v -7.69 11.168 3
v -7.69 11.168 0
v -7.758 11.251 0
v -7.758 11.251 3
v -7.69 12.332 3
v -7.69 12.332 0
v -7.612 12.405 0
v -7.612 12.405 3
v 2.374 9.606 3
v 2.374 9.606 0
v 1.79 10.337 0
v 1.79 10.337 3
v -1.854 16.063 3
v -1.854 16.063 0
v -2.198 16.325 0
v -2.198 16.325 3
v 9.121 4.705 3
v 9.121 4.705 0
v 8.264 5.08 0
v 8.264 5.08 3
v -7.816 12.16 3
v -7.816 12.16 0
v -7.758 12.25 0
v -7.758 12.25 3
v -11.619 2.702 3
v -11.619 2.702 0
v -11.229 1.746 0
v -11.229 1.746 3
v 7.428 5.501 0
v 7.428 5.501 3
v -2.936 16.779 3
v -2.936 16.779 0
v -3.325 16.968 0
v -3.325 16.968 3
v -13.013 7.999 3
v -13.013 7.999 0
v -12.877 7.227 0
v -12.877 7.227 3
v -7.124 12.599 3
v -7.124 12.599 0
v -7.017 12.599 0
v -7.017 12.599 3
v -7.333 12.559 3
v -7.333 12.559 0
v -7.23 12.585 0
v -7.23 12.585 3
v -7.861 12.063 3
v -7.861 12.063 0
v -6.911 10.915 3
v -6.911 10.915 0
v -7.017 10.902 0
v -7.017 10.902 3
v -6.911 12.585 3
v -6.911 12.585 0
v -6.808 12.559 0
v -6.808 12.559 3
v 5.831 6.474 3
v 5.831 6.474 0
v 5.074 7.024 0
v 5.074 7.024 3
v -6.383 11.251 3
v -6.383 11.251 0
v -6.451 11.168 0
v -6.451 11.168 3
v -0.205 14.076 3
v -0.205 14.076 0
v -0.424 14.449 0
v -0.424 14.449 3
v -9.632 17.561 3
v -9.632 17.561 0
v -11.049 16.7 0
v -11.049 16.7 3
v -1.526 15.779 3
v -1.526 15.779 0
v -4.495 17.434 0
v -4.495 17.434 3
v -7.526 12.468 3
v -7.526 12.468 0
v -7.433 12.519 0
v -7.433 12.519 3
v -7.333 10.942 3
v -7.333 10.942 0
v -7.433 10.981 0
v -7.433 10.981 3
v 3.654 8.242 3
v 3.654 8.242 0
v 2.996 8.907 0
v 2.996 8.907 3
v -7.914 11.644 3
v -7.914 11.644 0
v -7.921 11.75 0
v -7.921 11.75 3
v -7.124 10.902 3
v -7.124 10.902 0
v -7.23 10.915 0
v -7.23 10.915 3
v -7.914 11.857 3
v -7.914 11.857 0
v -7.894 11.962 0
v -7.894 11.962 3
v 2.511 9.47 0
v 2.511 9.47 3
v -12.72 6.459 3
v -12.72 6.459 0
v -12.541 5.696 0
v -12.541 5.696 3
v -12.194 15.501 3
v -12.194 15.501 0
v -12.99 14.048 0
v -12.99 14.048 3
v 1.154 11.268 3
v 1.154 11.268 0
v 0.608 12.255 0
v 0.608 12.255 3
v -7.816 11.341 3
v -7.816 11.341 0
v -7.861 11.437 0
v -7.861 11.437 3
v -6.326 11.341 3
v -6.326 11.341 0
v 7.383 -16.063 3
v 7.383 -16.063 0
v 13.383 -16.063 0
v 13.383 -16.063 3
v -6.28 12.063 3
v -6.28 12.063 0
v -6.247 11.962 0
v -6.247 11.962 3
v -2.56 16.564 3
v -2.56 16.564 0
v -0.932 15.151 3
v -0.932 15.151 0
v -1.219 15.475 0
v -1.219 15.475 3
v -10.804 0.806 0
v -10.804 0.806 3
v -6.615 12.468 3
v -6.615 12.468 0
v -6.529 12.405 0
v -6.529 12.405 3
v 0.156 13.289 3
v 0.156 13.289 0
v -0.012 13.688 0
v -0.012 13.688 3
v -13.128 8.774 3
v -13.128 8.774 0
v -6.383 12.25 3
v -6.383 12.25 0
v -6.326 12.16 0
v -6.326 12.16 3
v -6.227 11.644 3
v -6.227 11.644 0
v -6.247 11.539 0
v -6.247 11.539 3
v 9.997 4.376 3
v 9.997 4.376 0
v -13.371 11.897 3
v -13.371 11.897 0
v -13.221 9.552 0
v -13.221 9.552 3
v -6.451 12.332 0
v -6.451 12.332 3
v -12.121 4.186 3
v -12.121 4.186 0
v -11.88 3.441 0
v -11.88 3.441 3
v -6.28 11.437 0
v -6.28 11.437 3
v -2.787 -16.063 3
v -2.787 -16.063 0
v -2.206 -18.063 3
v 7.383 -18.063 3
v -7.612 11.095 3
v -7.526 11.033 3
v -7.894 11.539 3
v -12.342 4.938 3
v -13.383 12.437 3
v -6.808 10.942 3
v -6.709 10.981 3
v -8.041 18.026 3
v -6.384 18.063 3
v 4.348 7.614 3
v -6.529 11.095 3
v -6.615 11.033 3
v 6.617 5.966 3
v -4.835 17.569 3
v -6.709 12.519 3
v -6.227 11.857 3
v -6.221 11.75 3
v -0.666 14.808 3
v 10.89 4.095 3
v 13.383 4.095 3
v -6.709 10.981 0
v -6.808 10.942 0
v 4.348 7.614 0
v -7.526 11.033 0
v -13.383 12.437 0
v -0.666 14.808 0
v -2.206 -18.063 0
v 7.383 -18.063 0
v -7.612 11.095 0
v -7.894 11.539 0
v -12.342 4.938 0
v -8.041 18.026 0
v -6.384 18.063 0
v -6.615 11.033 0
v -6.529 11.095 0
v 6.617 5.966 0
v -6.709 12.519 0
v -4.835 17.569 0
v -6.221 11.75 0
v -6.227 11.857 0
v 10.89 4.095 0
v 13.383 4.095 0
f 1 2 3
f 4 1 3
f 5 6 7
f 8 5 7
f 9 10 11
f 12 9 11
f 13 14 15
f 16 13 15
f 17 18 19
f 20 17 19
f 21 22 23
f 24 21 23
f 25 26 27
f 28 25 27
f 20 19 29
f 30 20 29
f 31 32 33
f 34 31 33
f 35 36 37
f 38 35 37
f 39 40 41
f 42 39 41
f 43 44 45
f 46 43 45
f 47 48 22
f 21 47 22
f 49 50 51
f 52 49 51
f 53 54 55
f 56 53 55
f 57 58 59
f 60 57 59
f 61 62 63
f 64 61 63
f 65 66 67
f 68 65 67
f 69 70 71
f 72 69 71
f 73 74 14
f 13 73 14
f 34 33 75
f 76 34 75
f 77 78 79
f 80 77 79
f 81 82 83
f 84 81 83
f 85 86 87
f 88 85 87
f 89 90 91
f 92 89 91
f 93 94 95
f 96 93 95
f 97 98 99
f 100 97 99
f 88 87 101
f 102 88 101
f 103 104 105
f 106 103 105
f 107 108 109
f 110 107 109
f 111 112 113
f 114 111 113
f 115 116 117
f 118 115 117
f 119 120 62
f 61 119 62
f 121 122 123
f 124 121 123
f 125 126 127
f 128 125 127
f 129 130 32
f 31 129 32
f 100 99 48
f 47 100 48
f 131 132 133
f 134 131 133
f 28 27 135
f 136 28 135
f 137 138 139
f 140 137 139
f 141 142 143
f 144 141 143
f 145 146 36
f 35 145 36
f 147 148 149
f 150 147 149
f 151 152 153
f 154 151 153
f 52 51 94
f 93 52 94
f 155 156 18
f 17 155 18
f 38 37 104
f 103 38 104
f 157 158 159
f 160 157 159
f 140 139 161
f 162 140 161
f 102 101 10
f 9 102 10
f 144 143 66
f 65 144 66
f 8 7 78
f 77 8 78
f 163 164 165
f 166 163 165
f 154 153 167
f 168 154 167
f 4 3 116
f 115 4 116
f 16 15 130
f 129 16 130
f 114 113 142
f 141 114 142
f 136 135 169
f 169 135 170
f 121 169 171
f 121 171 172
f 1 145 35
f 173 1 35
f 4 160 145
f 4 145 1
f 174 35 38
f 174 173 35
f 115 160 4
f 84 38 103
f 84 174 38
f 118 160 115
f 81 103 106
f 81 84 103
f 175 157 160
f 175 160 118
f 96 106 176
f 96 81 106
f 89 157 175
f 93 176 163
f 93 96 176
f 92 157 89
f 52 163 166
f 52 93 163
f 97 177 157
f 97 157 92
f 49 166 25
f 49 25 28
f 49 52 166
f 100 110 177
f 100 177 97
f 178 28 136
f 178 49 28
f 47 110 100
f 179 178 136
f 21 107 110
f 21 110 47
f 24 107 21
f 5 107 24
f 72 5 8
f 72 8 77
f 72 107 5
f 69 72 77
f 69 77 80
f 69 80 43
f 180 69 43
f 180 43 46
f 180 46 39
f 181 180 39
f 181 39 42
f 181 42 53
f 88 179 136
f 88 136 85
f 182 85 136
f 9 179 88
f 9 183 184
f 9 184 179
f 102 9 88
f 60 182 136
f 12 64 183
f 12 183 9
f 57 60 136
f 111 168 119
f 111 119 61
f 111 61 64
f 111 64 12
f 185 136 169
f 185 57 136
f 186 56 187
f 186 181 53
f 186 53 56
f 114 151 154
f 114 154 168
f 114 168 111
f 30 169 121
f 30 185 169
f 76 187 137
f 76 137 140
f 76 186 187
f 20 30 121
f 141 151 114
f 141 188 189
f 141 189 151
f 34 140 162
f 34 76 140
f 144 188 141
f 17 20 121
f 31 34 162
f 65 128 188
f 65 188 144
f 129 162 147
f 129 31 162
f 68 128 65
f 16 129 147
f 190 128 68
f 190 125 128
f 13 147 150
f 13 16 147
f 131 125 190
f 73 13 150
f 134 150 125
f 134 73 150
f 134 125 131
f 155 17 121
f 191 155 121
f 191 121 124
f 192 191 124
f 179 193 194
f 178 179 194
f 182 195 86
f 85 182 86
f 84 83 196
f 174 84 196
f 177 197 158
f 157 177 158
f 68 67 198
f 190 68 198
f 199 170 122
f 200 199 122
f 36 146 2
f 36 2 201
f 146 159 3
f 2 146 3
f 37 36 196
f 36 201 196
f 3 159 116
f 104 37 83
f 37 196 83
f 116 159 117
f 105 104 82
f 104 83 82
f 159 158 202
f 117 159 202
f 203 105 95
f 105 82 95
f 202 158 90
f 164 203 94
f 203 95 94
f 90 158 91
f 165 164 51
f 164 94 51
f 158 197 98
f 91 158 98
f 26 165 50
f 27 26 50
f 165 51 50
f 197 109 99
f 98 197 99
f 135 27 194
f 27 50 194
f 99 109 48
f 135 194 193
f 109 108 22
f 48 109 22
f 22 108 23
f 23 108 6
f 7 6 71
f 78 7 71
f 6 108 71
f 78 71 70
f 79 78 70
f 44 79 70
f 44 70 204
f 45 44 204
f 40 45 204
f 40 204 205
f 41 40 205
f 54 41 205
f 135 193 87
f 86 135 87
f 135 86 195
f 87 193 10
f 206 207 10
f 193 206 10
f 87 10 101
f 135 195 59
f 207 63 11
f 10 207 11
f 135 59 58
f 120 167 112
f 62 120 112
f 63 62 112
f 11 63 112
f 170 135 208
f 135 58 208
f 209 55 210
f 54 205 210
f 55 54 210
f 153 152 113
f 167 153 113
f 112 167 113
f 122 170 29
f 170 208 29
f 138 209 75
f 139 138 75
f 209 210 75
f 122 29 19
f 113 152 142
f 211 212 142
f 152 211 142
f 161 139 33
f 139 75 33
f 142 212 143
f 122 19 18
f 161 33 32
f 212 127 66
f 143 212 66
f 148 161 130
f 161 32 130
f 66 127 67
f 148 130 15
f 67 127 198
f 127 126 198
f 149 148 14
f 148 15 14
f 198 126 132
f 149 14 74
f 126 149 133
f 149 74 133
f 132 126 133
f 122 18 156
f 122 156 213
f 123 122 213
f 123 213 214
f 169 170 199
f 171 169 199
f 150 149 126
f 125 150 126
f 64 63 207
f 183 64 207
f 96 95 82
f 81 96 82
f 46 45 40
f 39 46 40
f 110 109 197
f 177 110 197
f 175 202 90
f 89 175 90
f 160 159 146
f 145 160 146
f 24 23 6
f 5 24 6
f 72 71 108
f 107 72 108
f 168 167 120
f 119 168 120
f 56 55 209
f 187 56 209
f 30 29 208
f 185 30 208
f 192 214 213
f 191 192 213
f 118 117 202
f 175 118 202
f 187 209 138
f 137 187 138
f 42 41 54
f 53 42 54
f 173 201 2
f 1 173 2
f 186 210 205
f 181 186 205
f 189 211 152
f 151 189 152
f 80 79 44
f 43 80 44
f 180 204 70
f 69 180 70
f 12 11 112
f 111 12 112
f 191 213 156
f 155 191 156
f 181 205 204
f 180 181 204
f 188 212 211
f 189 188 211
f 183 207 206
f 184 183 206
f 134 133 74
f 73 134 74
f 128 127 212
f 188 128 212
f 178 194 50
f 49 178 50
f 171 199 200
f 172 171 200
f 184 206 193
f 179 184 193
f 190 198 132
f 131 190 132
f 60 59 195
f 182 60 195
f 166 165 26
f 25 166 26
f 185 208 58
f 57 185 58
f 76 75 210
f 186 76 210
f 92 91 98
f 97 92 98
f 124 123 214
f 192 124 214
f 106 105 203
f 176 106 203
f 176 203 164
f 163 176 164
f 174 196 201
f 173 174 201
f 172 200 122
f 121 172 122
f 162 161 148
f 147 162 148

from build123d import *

# Parameters (mm, degrees)
F1_DEPTH = 3


with BuildPart() as f1:
    # F0 (on Top) → F1 (new body)
    with BuildSketch(Plane.XY):
        Polygon((2.510942, 9.469501), (2.373605, 9.605645), (1.790243, 10.337165), (1.153897, 11.268456), (0.607543, 12.255246), (0.155931, 13.288848), (-0.011836, 13.688085), (-0.205334, 14.075512), (-0.423774, 14.44945), (-0.666191, 14.808327), (-0.931545, 15.150541), (-1.218717, 15.474696), (-1.526489, 15.779394), (-1.853514, 16.06329), (-2.198395, 16.32519), (-2.559685, 16.563975), (-2.935808, 16.77863), (-3.325165, 16.968241), (-4.495444, 17.43362), (-4.835398, 17.568824), (-6.383731, 18.062981), (-8.041005, 18.025669), (-9.632137, 17.560696), (-11.048721, 16.699738), (-12.194184, 15.501493), (-12.9905, 14.047597), (-13.383387, 12.437161), (-13.371246, 11.897258), (-13.221005, 9.551822), (-13.127761, 8.77377), (-13.01308, 7.998612), (-12.876987, 7.226884), (-12.719634, 6.459245), (-12.541148, 5.696229), (-12.341606, 4.938446), (-12.12121, 4.186453), (-11.880139, 3.440862), (-11.618519, 2.702204), (-11.229289, 1.746326), (-10.804017, 0.805917), (-2.786634, -16.062985), (-2.205609, -18.063007), (7.383374, -18.063007), (7.383374, -16.062985), (13.383387, -16.062985), (13.383387, 4.095013), (11.383391, 4.095013), (10.88964, 4.095013), (9.997161, 4.375937), (9.121089, 4.704512), (8.263992, 5.079771), (7.428357, 5.500675), (6.616573, 5.965927), (5.831053, 6.474257), (5.074031, 7.024116), (4.347693, 7.61398), (3.654196, 8.242071), (2.995549, 8.906612), align=None)
        Polygon((-6.247359, 11.961622), (-6.227369, 11.856771), (-6.220663, 11.750243), (-6.227369, 11.643716), (-6.247359, 11.538839), (-6.280353, 11.437341), (-6.325794, 11.340744), (-6.382995, 11.250625), (-6.451041, 11.16838), (-6.528841, 11.095304), (-6.615201, 11.032566), (-6.70875, 10.981131), (-6.807987, 10.941837), (-6.911391, 10.915294), (-7.017283, 10.901909), (-7.12404, 10.901909), (-7.229932, 10.915294), (-7.333336, 10.941837), (-7.432573, 10.981131), (-7.526122, 11.032566), (-7.612482, 11.095304), (-7.690282, 11.16838), (-7.758328, 11.250625), (-7.815529, 11.340744), (-7.86097, 11.437341), (-7.893964, 11.538839), (-7.913954, 11.643716), (-7.92066, 11.750243), (-7.913954, 11.856771), (-7.893964, 11.961622), (-7.86097, 12.063146), (-7.815529, 12.159717), (-7.758328, 12.249861), (-7.690282, 12.332106), (-7.612482, 12.405182), (-7.526122, 12.46792), (-7.432573, 12.51933), (-7.333336, 12.558624), (-7.229932, 12.585192), (-7.12404, 12.598552), (-7.017283, 12.598552), (-6.911391, 12.585192), (-6.807987, 12.558624), (-6.70875, 12.51933), (-6.615201, 12.46792), (-6.528841, 12.405182), (-6.451041, 12.332106), (-6.382995, 12.249861), (-6.325794, 12.159717), (-6.280353, 12.063146), align=None, mode=Mode.SUBTRACT)
    extrude(amount=F1_DEPTH)


solid = f1.part
